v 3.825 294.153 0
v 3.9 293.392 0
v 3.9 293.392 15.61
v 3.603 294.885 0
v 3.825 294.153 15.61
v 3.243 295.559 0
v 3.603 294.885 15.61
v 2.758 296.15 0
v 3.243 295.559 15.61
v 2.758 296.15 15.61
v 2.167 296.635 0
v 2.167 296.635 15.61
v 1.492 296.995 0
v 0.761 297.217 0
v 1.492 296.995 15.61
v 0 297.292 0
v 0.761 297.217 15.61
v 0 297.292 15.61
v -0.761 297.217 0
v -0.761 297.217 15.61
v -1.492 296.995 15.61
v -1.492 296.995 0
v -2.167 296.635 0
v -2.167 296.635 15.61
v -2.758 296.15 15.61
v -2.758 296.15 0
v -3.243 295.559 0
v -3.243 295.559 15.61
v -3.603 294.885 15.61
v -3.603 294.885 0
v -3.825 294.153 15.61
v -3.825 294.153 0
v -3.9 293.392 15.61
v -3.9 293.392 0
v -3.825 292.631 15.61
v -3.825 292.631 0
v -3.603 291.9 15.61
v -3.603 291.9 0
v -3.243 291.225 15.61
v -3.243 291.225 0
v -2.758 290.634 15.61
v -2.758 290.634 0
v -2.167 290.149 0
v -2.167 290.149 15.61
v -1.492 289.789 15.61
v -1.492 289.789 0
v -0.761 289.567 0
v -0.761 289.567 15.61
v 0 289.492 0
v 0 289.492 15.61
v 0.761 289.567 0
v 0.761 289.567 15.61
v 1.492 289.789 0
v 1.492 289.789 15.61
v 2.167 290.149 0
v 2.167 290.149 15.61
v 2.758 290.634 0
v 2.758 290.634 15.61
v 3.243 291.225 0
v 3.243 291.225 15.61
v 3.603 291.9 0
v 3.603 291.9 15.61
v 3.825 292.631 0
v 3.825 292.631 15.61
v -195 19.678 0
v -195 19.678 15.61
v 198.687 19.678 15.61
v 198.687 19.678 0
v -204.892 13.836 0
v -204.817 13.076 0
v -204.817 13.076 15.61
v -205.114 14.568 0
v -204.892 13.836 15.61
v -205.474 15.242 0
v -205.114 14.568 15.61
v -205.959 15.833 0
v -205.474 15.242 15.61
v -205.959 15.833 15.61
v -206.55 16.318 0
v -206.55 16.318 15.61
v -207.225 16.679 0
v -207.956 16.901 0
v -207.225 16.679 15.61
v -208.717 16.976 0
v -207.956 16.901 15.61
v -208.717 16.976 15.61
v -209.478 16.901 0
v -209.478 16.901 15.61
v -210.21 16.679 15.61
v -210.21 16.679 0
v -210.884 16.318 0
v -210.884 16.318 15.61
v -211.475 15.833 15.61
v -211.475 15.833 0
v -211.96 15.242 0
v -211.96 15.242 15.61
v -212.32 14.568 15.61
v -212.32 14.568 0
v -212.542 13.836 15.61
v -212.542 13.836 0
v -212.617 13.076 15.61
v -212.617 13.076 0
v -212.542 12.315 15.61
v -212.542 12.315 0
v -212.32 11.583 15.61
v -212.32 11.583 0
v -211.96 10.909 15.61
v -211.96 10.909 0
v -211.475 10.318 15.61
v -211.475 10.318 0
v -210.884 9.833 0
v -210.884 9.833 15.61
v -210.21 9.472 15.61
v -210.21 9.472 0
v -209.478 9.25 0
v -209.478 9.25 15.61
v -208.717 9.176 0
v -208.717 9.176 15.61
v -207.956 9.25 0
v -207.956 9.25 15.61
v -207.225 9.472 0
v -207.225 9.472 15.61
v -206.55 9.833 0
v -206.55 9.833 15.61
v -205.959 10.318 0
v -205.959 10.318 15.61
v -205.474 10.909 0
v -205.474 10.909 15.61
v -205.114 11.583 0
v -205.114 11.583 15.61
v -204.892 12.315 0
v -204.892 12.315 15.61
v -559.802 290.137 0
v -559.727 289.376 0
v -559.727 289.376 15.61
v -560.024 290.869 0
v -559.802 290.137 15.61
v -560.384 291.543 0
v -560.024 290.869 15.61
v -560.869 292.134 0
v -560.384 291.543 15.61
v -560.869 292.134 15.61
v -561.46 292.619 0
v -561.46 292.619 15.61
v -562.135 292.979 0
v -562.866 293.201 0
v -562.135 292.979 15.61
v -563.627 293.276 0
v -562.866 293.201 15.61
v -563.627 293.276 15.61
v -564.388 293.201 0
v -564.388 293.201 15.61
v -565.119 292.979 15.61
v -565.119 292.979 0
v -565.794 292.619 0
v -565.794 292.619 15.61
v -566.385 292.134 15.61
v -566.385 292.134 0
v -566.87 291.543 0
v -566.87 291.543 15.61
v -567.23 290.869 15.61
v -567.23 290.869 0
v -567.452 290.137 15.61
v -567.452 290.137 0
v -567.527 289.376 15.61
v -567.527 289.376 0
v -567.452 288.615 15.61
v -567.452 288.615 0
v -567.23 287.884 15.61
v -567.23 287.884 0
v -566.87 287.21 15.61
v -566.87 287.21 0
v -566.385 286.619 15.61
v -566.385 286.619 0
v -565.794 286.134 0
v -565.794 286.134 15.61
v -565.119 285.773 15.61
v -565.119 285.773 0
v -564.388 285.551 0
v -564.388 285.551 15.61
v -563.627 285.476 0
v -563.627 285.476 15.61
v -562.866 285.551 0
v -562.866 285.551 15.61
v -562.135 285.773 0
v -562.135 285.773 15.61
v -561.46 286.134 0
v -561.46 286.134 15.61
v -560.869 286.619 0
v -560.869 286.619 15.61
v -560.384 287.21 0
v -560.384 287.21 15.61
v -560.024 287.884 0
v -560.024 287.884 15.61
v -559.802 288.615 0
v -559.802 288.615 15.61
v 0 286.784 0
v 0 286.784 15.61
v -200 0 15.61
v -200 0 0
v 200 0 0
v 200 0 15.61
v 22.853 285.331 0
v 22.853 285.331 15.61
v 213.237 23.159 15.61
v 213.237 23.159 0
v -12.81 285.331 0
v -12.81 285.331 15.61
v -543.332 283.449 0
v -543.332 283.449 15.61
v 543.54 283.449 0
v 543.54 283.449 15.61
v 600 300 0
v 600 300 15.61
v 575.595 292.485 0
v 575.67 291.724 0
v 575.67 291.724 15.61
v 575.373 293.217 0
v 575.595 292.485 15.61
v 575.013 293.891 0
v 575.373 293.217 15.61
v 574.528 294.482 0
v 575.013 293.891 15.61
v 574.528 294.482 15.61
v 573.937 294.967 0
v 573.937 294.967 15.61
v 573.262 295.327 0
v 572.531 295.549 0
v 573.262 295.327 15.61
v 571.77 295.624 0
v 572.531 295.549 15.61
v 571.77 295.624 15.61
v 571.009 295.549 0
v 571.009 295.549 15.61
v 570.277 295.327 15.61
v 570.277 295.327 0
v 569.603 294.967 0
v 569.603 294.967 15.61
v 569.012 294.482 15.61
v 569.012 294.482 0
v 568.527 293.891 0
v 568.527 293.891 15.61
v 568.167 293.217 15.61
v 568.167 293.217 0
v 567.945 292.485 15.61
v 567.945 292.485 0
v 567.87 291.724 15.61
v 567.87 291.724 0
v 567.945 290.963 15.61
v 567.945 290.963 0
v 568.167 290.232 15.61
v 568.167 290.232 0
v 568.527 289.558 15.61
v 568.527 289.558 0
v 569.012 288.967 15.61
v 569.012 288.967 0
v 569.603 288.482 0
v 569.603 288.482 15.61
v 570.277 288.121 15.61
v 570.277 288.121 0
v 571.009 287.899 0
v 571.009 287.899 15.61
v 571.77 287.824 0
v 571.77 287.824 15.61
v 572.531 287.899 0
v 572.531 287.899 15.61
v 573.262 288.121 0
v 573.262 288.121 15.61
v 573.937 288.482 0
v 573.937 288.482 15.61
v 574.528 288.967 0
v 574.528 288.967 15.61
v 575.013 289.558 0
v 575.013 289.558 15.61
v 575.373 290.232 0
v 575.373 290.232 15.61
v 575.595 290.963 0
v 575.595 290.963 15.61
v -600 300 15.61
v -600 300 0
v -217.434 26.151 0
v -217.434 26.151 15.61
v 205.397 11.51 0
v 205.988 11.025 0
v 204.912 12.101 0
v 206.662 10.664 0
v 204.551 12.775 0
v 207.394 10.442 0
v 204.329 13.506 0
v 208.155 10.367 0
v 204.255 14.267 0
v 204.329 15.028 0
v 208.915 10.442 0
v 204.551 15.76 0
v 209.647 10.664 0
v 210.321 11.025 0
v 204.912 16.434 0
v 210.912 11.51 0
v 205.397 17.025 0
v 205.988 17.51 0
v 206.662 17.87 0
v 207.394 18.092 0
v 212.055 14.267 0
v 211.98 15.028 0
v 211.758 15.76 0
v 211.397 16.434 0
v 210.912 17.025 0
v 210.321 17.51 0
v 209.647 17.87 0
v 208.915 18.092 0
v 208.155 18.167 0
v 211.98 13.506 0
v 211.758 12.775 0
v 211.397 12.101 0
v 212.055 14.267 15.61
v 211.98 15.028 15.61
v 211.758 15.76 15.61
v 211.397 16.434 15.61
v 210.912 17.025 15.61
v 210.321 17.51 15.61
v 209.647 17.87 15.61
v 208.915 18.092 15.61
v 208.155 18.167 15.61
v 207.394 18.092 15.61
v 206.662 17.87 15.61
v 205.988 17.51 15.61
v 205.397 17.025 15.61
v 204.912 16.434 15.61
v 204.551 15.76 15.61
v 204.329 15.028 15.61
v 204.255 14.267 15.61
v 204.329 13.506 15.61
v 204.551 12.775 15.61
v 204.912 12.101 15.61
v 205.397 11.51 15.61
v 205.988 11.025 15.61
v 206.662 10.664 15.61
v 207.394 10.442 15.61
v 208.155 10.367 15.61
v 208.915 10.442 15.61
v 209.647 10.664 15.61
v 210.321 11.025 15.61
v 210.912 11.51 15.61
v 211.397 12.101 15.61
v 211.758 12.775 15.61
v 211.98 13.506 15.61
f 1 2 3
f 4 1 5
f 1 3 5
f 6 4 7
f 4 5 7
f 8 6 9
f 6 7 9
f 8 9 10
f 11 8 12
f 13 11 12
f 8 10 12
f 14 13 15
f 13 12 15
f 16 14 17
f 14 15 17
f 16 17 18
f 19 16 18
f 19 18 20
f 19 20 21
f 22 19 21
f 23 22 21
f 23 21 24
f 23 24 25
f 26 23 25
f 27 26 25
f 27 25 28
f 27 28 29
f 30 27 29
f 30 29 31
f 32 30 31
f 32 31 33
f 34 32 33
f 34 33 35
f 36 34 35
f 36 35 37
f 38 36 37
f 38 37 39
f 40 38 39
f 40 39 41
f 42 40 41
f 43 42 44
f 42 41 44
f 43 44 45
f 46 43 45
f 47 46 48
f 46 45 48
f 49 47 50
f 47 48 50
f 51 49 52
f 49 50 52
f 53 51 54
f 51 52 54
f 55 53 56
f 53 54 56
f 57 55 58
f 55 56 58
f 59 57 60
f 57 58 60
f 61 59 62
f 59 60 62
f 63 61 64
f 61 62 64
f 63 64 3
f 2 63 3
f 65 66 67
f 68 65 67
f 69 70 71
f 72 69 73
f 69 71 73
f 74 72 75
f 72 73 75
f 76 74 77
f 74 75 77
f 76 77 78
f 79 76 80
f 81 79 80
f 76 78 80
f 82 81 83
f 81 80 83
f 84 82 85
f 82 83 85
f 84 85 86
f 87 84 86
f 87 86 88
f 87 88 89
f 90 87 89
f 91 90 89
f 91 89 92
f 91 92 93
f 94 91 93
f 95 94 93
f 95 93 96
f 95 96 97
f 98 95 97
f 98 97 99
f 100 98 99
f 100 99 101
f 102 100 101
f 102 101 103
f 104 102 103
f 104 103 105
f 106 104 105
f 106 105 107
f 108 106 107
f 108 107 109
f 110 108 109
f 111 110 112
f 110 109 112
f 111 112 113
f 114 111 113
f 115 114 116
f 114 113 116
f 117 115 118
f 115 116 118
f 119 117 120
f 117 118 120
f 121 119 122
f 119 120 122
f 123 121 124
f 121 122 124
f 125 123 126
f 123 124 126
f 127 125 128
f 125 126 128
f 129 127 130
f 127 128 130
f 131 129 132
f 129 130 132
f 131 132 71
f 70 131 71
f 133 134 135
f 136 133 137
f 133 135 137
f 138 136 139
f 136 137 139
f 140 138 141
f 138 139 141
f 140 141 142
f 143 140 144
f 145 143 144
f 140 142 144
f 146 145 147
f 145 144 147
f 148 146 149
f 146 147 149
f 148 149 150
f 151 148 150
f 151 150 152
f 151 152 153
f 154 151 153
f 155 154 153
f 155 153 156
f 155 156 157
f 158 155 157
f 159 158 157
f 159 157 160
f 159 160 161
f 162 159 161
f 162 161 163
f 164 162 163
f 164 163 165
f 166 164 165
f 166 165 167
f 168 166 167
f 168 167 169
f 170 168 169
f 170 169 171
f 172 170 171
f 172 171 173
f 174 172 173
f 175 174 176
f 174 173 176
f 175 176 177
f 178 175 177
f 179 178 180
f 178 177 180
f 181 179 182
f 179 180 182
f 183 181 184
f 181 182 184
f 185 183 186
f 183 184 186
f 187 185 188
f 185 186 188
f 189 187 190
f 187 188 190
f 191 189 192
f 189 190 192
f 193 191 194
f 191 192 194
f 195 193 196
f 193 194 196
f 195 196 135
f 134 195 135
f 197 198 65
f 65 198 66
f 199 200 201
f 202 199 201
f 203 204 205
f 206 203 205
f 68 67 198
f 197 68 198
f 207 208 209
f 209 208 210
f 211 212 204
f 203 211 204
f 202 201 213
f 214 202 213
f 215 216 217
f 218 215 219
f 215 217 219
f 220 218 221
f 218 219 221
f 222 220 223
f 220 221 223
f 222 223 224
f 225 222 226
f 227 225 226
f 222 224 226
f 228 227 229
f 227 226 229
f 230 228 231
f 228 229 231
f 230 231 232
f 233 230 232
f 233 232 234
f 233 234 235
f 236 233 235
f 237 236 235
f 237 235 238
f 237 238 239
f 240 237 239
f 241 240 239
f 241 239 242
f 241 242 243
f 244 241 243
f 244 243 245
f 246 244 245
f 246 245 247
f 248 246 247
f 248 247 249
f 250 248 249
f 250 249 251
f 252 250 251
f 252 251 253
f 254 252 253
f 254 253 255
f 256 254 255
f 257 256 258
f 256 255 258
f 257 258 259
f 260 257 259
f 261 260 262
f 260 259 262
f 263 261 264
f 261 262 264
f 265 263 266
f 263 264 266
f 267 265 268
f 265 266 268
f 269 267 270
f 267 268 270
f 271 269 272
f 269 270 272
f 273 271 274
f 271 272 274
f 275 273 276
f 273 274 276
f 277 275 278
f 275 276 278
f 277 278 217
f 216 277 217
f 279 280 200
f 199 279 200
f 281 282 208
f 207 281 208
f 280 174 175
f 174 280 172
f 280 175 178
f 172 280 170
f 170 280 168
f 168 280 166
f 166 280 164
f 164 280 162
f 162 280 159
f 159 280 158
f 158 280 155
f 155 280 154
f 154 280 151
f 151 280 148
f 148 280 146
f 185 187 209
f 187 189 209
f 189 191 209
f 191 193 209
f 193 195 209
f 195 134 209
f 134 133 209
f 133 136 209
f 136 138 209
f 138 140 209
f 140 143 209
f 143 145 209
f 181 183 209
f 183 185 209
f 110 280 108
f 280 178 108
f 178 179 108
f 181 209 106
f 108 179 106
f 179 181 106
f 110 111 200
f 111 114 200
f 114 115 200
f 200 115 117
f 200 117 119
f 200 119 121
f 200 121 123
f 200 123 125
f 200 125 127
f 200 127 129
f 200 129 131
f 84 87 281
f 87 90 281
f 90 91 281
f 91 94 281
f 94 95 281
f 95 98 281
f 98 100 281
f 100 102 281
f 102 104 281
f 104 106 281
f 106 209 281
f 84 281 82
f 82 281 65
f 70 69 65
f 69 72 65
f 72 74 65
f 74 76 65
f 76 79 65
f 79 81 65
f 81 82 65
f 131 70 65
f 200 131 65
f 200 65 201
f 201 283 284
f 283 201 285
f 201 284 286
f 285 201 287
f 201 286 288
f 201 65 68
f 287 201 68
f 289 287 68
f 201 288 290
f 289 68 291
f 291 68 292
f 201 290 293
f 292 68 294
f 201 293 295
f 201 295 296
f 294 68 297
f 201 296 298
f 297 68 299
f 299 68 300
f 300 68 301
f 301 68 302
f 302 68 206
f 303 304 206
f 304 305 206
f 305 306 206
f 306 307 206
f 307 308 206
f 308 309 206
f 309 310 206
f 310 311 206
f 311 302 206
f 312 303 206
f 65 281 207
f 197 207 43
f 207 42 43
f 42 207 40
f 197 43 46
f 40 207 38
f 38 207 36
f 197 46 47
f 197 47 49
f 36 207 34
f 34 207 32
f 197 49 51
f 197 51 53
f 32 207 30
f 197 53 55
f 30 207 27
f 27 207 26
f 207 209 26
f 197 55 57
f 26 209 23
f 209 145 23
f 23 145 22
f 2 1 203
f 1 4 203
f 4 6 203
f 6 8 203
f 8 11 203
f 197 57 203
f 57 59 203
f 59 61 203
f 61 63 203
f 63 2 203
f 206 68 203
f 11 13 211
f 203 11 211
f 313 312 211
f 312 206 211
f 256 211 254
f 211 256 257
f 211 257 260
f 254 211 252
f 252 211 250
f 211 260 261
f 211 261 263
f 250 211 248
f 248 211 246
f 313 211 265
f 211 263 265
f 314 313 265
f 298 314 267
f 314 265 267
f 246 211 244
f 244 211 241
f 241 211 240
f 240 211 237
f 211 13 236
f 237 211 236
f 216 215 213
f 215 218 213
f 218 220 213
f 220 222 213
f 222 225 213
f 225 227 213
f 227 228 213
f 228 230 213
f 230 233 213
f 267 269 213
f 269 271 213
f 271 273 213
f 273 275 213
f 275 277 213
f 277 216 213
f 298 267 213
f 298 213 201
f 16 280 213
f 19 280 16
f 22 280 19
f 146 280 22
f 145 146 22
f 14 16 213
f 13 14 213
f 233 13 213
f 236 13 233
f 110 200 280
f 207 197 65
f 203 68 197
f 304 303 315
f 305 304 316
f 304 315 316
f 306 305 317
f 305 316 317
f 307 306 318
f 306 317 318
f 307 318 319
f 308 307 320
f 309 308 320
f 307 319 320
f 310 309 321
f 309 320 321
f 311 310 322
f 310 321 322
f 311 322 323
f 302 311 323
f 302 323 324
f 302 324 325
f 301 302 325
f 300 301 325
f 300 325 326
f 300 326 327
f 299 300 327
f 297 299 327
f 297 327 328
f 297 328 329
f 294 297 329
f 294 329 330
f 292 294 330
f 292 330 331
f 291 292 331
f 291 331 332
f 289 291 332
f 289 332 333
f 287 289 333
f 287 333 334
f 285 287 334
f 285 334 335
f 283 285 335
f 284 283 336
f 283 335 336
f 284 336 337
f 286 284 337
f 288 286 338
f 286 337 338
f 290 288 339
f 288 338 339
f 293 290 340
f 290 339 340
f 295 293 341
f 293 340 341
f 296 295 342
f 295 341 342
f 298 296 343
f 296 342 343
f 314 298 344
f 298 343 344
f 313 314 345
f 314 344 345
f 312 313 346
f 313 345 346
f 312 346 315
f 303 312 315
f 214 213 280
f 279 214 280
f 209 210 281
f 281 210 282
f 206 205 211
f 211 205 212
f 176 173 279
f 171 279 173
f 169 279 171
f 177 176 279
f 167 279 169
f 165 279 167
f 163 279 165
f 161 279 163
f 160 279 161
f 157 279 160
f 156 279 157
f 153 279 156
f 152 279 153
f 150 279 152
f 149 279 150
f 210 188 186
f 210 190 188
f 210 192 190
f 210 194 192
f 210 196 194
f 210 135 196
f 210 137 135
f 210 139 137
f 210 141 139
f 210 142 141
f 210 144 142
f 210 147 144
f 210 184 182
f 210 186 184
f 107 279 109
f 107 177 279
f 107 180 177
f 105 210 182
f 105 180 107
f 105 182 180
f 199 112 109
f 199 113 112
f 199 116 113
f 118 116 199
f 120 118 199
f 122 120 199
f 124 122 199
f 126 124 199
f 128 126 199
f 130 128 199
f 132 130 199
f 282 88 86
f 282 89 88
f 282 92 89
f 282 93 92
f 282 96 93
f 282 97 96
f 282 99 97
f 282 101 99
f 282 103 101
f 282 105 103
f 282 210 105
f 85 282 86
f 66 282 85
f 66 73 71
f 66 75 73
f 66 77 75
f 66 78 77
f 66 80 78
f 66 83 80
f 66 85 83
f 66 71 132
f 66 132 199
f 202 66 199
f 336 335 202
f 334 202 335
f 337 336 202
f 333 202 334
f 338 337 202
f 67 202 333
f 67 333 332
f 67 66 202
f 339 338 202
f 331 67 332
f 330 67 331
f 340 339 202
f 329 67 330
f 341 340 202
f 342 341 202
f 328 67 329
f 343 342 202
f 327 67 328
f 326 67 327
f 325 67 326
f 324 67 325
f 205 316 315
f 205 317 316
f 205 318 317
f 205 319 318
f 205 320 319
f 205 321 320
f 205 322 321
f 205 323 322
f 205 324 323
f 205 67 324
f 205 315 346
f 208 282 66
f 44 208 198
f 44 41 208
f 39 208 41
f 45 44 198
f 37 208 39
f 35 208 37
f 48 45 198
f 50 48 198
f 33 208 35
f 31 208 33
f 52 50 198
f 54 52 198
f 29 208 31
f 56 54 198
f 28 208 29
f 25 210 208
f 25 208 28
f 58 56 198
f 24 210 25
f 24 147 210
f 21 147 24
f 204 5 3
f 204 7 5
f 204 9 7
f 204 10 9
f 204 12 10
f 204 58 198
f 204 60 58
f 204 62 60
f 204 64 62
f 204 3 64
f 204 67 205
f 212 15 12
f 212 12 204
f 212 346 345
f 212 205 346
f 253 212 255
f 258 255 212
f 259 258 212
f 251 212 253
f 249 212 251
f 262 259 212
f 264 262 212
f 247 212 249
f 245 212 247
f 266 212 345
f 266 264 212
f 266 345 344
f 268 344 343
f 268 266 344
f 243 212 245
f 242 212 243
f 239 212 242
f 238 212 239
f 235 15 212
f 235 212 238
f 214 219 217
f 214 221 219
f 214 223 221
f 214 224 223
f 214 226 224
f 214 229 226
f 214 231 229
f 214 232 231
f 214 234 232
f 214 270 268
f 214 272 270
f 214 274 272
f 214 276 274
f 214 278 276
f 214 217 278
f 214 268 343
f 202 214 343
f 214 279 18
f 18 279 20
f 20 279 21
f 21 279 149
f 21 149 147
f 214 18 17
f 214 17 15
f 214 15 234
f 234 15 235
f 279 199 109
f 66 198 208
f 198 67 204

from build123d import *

# Parameters (mm, degrees)
BOSS_EXTRUDE2_DEPTH = 15.61
CUT_EXTRUDE1_DEPTH  = 672.00199113
CUT_EXTRUDE2_DEPTH  = 672.00199113
SKETCH7_R           = 3.9
CUT_EXTRUDE3_DEPTH  = 672.00199113


with BuildPart() as part:
    # Sketch2 → Boss-Extrude2 (new body)
    with BuildSketch(Plane.XY):
        Polygon((-200, 0), (200, 0), (600, 300), (-600, 300), align=None)
    extrude(amount=BOSS_EXTRUDE2_DEPTH)

    # Sketch3 → Cut-Extrude1 (cut, through all)
    with BuildSketch(Plane.XY.offset(15.61)):
        Polygon((-195, 19.678308093), (198.68730415, 19.678308093), (0, 286.78421274), align=None)
    extrude(amount=-CUT_EXTRUDE1_DEPTH, mode=Mode.SUBTRACT)

    # Sketch5 → Cut-Extrude2 (cut, through all)
    with BuildSketch(Plane.XY.offset(15.61)):
        Polygon((-217.434189149, 26.151043002), (-12.810282728, 285.331439802), (-543.331948452, 283.448560198), align=None)
        Polygon((543.539861229, 283.448560198), (22.85265332, 285.331439802), (213.236522938, 23.158727928), align=None)
    extrude(amount=-CUT_EXTRUDE2_DEPTH, mode=Mode.SUBTRACT)

    # Sketch7 → Cut-Extrude3 (cut, through all)
    with BuildSketch(Plane.XY.offset(15.61)):
        with Locations((-563.626982451, 289.376274745)):
            Circle(SKETCH7_R)
        with Locations((0, 293.39210637)):
            Circle(SKETCH7_R)
        with Locations((571.769930615, 291.724280099)):
            Circle(SKETCH7_R)
        with Locations((208.154539122, 14.26724781)):
            Circle(SKETCH7_R)
        with Locations((-208.717094574, 13.075521501)):
            Circle(SKETCH7_R)
    extrude(amount=-CUT_EXTRUDE3_DEPTH, mode=Mode.SUBTRACT)


solid = part.part
